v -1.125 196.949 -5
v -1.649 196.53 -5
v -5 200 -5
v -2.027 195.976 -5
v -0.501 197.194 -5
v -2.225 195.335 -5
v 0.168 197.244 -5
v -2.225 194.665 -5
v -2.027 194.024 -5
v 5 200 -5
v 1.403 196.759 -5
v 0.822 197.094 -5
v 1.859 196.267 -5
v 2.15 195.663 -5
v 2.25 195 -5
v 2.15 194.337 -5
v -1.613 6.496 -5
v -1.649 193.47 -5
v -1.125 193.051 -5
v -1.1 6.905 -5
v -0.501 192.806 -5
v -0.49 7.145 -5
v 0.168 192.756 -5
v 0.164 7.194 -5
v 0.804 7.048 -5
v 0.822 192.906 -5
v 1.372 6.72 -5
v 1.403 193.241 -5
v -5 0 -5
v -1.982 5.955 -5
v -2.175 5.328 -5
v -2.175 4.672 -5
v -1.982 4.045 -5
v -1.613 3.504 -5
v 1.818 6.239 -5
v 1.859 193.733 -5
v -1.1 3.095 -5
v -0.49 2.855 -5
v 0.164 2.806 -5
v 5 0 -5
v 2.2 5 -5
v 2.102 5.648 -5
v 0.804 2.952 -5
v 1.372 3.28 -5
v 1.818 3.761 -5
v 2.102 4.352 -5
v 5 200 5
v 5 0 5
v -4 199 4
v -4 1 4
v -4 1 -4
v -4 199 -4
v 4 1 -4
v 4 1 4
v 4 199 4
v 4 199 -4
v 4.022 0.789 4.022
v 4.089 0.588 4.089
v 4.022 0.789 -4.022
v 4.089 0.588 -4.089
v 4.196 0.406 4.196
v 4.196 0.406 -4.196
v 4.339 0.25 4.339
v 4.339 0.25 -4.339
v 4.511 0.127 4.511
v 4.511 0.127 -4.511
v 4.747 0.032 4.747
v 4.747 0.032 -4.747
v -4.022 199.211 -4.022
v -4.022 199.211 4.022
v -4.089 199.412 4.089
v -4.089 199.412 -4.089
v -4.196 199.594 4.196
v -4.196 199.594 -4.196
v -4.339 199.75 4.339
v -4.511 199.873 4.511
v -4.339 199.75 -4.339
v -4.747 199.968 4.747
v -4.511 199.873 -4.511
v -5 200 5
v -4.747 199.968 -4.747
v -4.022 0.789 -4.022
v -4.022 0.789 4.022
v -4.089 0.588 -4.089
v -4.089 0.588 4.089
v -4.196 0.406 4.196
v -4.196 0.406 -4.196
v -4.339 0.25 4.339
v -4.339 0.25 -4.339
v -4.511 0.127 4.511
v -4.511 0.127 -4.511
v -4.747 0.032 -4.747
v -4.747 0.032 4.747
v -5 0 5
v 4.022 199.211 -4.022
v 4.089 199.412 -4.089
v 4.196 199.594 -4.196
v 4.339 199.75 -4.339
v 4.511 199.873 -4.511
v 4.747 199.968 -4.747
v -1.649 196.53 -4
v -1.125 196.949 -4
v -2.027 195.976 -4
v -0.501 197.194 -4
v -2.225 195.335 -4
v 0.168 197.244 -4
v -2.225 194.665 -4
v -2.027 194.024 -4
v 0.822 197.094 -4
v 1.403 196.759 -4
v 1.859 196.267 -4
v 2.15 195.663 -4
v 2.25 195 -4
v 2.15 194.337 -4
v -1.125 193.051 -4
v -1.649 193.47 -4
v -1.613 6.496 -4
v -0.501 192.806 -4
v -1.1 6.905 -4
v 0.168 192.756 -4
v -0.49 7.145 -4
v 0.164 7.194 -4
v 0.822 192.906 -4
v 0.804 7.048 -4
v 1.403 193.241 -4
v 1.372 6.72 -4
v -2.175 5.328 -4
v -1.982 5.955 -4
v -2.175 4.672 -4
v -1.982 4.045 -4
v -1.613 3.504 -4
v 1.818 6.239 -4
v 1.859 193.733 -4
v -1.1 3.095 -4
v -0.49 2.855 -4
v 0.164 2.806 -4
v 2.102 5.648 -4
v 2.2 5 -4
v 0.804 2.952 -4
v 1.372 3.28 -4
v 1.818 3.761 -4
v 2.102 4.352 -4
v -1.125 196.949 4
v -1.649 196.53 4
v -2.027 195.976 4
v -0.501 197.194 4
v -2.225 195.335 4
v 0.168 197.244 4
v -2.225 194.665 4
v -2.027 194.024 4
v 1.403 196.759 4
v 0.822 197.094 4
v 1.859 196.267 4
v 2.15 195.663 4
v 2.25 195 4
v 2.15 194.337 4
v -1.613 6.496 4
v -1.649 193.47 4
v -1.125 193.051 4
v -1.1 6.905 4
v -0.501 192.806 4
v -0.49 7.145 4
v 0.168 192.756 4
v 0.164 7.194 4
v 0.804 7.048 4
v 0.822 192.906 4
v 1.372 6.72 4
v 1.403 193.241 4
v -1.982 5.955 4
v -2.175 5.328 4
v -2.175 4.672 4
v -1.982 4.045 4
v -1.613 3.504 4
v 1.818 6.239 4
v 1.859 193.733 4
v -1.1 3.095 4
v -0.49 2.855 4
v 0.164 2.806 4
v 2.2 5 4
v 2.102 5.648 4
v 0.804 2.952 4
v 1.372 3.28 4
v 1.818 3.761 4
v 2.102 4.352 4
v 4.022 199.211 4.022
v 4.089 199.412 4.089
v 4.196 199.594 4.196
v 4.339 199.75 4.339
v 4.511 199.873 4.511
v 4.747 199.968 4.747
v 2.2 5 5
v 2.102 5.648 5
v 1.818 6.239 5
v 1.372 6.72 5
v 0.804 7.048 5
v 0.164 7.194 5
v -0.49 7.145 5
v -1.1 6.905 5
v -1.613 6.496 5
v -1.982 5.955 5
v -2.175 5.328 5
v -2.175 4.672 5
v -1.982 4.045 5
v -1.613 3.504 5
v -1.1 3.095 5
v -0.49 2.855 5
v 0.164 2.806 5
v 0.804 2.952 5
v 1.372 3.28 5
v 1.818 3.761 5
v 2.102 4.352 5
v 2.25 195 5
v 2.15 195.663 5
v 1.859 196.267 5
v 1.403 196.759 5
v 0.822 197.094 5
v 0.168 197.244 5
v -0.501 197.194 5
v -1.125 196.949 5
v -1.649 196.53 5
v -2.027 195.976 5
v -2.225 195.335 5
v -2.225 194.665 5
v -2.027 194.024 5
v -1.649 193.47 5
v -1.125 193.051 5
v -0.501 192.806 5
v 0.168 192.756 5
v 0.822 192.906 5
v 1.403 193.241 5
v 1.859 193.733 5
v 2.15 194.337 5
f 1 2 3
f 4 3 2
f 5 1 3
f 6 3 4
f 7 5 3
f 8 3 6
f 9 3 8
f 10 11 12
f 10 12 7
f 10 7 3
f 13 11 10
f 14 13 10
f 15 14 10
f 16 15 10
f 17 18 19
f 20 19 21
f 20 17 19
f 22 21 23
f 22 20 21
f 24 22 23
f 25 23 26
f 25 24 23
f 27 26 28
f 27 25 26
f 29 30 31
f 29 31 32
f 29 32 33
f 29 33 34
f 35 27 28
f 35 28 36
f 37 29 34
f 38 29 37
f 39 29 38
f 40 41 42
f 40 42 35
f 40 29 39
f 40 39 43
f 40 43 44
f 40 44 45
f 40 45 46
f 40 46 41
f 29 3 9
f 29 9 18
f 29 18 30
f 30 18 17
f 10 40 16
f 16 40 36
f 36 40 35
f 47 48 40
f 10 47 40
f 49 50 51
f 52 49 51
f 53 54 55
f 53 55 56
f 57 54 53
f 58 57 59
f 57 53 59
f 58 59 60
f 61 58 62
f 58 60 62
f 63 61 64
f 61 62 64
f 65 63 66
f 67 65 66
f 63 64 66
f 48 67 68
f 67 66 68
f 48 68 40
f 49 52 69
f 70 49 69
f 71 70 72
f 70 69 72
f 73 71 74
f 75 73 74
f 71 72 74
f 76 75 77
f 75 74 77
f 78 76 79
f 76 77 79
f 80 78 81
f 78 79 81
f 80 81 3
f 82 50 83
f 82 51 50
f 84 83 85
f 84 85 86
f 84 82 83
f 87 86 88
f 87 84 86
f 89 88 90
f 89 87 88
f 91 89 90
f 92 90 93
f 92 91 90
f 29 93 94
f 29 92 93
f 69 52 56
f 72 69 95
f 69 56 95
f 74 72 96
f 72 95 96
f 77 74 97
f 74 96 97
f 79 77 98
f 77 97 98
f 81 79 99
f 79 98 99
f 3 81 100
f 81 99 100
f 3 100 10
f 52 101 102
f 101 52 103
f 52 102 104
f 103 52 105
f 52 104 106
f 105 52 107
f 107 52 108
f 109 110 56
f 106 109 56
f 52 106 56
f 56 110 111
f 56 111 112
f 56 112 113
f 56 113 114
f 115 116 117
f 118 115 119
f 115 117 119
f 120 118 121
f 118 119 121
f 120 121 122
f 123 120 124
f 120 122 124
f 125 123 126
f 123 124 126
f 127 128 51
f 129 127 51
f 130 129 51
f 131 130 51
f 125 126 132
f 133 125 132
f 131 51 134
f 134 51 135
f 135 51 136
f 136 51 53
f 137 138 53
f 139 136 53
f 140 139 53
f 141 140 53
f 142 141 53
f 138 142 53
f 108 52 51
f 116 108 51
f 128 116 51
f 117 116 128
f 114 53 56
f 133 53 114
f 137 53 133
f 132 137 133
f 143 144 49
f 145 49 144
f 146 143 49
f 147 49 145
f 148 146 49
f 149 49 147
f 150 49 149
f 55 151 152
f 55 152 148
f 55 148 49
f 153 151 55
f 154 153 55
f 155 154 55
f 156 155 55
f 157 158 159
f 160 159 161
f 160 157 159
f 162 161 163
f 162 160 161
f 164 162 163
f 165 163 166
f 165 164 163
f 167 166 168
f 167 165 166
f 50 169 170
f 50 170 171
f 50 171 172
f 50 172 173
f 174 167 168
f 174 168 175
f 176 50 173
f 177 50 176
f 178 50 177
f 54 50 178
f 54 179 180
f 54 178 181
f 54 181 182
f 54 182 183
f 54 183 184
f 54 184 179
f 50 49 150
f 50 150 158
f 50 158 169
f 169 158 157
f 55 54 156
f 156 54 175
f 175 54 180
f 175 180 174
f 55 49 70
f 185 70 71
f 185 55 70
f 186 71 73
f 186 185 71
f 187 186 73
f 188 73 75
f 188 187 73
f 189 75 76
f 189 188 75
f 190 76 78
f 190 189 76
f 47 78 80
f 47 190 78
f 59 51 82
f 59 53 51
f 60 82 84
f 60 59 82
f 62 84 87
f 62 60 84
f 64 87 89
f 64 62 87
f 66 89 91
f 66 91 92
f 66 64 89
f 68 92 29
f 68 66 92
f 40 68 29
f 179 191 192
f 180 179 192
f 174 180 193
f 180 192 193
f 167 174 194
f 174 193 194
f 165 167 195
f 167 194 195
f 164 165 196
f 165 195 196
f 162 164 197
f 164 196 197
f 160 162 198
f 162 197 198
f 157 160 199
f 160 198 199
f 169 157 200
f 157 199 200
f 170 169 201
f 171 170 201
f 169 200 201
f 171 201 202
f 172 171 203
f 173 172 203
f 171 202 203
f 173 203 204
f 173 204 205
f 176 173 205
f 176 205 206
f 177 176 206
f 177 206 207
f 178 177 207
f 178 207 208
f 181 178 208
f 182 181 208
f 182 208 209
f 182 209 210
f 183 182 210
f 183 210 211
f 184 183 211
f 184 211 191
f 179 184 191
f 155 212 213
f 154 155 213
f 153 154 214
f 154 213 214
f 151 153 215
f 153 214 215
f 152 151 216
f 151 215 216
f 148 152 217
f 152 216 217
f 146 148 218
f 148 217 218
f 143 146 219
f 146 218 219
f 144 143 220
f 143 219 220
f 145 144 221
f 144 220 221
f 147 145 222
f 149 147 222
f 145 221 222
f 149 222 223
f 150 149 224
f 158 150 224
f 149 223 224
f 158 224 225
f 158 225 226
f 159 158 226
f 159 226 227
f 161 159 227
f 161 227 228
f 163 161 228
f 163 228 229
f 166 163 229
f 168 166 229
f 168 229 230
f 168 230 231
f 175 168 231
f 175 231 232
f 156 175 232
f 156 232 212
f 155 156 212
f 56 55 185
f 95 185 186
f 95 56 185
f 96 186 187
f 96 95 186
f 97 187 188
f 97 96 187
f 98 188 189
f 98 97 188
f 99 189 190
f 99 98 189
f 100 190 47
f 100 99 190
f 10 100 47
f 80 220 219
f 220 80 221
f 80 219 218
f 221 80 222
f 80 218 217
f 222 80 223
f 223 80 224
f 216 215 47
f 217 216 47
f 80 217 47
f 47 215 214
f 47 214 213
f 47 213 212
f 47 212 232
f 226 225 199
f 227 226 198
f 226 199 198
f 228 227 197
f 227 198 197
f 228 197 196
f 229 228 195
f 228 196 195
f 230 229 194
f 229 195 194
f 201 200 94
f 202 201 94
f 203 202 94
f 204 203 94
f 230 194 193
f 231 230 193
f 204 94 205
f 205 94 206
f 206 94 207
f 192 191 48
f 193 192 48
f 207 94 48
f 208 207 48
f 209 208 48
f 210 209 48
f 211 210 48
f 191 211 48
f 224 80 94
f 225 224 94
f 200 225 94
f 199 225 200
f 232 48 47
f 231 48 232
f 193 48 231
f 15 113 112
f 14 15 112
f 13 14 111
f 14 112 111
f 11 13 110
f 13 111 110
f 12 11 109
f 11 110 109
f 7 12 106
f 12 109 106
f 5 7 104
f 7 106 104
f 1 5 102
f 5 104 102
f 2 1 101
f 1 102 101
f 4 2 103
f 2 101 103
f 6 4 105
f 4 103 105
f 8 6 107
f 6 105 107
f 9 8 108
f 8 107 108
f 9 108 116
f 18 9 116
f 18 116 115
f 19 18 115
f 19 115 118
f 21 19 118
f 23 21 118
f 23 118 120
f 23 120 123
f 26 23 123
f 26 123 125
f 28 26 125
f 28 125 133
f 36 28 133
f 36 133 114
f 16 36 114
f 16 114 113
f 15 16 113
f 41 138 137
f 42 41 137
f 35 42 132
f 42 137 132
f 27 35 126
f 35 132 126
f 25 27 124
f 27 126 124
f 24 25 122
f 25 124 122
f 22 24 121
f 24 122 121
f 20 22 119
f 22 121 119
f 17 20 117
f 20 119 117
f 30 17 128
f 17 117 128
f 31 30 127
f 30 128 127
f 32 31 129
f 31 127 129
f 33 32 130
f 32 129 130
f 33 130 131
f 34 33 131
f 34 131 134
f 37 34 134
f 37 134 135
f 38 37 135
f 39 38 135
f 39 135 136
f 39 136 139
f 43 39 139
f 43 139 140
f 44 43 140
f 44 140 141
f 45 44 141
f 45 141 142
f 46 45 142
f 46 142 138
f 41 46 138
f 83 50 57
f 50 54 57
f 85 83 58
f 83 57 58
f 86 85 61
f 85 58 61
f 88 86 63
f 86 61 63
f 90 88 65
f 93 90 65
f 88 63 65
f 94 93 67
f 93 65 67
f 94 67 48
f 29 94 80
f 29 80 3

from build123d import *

# Parameters (mm, degrees)
SKETCH1_W           = 10
SKETCH1_H           = 10
SKETCH1_W_2         = 8
SKETCH1_H_2         = 8
BOSS_EXTRUDE1_DEPTH = 200
FILLET2_R           = 1
SKETCH2_R           = 2.2
SKETCH2_R_2         = 2.25
CUT_EXTRUDE1_DEPTH  = 201.31225624


with BuildPart() as part:
    # Sketch1 → Boss-Extrude1 (new body)
    with BuildSketch(Plane(origin=(0, 0, 0), x_dir=(1, 0, 0), z_dir=(0, 1, 0))):
        Rectangle(SKETCH1_W, SKETCH1_H)
        Rectangle(SKETCH1_W_2, SKETCH1_H_2, mode=Mode.SUBTRACT)
    extrude(amount=BOSS_EXTRUDE1_DEPTH)

    # Fillet2
    fillet2_edges = [part.edges().sort_by_distance(p)[0] for p in [
        (4, 0, 0),
        (0, 0, -4),
        (-4, 0, 0),
        (0, 0, 4),
        (4, 200, 0),
        (0, 200, -4),
        (-4, 200, 0),
        (0, 200, 4),
    ]]
    fillet(fillet2_edges, radius=FILLET2_R - 0.0001)  # a hair under: the kernel refuses the full size

    # Sketch2 → Cut-Extrude1 (cut, through all)
    with BuildSketch(Plane.XY.offset(5)):
        with Locations((0, 5)):
            Circle(SKETCH2_R)
        with Locations((0, 195)):
            Circle(SKETCH2_R_2)
    extrude(amount=-CUT_EXTRUDE1_DEPTH, mode=Mode.SUBTRACT)


solid = part.part
